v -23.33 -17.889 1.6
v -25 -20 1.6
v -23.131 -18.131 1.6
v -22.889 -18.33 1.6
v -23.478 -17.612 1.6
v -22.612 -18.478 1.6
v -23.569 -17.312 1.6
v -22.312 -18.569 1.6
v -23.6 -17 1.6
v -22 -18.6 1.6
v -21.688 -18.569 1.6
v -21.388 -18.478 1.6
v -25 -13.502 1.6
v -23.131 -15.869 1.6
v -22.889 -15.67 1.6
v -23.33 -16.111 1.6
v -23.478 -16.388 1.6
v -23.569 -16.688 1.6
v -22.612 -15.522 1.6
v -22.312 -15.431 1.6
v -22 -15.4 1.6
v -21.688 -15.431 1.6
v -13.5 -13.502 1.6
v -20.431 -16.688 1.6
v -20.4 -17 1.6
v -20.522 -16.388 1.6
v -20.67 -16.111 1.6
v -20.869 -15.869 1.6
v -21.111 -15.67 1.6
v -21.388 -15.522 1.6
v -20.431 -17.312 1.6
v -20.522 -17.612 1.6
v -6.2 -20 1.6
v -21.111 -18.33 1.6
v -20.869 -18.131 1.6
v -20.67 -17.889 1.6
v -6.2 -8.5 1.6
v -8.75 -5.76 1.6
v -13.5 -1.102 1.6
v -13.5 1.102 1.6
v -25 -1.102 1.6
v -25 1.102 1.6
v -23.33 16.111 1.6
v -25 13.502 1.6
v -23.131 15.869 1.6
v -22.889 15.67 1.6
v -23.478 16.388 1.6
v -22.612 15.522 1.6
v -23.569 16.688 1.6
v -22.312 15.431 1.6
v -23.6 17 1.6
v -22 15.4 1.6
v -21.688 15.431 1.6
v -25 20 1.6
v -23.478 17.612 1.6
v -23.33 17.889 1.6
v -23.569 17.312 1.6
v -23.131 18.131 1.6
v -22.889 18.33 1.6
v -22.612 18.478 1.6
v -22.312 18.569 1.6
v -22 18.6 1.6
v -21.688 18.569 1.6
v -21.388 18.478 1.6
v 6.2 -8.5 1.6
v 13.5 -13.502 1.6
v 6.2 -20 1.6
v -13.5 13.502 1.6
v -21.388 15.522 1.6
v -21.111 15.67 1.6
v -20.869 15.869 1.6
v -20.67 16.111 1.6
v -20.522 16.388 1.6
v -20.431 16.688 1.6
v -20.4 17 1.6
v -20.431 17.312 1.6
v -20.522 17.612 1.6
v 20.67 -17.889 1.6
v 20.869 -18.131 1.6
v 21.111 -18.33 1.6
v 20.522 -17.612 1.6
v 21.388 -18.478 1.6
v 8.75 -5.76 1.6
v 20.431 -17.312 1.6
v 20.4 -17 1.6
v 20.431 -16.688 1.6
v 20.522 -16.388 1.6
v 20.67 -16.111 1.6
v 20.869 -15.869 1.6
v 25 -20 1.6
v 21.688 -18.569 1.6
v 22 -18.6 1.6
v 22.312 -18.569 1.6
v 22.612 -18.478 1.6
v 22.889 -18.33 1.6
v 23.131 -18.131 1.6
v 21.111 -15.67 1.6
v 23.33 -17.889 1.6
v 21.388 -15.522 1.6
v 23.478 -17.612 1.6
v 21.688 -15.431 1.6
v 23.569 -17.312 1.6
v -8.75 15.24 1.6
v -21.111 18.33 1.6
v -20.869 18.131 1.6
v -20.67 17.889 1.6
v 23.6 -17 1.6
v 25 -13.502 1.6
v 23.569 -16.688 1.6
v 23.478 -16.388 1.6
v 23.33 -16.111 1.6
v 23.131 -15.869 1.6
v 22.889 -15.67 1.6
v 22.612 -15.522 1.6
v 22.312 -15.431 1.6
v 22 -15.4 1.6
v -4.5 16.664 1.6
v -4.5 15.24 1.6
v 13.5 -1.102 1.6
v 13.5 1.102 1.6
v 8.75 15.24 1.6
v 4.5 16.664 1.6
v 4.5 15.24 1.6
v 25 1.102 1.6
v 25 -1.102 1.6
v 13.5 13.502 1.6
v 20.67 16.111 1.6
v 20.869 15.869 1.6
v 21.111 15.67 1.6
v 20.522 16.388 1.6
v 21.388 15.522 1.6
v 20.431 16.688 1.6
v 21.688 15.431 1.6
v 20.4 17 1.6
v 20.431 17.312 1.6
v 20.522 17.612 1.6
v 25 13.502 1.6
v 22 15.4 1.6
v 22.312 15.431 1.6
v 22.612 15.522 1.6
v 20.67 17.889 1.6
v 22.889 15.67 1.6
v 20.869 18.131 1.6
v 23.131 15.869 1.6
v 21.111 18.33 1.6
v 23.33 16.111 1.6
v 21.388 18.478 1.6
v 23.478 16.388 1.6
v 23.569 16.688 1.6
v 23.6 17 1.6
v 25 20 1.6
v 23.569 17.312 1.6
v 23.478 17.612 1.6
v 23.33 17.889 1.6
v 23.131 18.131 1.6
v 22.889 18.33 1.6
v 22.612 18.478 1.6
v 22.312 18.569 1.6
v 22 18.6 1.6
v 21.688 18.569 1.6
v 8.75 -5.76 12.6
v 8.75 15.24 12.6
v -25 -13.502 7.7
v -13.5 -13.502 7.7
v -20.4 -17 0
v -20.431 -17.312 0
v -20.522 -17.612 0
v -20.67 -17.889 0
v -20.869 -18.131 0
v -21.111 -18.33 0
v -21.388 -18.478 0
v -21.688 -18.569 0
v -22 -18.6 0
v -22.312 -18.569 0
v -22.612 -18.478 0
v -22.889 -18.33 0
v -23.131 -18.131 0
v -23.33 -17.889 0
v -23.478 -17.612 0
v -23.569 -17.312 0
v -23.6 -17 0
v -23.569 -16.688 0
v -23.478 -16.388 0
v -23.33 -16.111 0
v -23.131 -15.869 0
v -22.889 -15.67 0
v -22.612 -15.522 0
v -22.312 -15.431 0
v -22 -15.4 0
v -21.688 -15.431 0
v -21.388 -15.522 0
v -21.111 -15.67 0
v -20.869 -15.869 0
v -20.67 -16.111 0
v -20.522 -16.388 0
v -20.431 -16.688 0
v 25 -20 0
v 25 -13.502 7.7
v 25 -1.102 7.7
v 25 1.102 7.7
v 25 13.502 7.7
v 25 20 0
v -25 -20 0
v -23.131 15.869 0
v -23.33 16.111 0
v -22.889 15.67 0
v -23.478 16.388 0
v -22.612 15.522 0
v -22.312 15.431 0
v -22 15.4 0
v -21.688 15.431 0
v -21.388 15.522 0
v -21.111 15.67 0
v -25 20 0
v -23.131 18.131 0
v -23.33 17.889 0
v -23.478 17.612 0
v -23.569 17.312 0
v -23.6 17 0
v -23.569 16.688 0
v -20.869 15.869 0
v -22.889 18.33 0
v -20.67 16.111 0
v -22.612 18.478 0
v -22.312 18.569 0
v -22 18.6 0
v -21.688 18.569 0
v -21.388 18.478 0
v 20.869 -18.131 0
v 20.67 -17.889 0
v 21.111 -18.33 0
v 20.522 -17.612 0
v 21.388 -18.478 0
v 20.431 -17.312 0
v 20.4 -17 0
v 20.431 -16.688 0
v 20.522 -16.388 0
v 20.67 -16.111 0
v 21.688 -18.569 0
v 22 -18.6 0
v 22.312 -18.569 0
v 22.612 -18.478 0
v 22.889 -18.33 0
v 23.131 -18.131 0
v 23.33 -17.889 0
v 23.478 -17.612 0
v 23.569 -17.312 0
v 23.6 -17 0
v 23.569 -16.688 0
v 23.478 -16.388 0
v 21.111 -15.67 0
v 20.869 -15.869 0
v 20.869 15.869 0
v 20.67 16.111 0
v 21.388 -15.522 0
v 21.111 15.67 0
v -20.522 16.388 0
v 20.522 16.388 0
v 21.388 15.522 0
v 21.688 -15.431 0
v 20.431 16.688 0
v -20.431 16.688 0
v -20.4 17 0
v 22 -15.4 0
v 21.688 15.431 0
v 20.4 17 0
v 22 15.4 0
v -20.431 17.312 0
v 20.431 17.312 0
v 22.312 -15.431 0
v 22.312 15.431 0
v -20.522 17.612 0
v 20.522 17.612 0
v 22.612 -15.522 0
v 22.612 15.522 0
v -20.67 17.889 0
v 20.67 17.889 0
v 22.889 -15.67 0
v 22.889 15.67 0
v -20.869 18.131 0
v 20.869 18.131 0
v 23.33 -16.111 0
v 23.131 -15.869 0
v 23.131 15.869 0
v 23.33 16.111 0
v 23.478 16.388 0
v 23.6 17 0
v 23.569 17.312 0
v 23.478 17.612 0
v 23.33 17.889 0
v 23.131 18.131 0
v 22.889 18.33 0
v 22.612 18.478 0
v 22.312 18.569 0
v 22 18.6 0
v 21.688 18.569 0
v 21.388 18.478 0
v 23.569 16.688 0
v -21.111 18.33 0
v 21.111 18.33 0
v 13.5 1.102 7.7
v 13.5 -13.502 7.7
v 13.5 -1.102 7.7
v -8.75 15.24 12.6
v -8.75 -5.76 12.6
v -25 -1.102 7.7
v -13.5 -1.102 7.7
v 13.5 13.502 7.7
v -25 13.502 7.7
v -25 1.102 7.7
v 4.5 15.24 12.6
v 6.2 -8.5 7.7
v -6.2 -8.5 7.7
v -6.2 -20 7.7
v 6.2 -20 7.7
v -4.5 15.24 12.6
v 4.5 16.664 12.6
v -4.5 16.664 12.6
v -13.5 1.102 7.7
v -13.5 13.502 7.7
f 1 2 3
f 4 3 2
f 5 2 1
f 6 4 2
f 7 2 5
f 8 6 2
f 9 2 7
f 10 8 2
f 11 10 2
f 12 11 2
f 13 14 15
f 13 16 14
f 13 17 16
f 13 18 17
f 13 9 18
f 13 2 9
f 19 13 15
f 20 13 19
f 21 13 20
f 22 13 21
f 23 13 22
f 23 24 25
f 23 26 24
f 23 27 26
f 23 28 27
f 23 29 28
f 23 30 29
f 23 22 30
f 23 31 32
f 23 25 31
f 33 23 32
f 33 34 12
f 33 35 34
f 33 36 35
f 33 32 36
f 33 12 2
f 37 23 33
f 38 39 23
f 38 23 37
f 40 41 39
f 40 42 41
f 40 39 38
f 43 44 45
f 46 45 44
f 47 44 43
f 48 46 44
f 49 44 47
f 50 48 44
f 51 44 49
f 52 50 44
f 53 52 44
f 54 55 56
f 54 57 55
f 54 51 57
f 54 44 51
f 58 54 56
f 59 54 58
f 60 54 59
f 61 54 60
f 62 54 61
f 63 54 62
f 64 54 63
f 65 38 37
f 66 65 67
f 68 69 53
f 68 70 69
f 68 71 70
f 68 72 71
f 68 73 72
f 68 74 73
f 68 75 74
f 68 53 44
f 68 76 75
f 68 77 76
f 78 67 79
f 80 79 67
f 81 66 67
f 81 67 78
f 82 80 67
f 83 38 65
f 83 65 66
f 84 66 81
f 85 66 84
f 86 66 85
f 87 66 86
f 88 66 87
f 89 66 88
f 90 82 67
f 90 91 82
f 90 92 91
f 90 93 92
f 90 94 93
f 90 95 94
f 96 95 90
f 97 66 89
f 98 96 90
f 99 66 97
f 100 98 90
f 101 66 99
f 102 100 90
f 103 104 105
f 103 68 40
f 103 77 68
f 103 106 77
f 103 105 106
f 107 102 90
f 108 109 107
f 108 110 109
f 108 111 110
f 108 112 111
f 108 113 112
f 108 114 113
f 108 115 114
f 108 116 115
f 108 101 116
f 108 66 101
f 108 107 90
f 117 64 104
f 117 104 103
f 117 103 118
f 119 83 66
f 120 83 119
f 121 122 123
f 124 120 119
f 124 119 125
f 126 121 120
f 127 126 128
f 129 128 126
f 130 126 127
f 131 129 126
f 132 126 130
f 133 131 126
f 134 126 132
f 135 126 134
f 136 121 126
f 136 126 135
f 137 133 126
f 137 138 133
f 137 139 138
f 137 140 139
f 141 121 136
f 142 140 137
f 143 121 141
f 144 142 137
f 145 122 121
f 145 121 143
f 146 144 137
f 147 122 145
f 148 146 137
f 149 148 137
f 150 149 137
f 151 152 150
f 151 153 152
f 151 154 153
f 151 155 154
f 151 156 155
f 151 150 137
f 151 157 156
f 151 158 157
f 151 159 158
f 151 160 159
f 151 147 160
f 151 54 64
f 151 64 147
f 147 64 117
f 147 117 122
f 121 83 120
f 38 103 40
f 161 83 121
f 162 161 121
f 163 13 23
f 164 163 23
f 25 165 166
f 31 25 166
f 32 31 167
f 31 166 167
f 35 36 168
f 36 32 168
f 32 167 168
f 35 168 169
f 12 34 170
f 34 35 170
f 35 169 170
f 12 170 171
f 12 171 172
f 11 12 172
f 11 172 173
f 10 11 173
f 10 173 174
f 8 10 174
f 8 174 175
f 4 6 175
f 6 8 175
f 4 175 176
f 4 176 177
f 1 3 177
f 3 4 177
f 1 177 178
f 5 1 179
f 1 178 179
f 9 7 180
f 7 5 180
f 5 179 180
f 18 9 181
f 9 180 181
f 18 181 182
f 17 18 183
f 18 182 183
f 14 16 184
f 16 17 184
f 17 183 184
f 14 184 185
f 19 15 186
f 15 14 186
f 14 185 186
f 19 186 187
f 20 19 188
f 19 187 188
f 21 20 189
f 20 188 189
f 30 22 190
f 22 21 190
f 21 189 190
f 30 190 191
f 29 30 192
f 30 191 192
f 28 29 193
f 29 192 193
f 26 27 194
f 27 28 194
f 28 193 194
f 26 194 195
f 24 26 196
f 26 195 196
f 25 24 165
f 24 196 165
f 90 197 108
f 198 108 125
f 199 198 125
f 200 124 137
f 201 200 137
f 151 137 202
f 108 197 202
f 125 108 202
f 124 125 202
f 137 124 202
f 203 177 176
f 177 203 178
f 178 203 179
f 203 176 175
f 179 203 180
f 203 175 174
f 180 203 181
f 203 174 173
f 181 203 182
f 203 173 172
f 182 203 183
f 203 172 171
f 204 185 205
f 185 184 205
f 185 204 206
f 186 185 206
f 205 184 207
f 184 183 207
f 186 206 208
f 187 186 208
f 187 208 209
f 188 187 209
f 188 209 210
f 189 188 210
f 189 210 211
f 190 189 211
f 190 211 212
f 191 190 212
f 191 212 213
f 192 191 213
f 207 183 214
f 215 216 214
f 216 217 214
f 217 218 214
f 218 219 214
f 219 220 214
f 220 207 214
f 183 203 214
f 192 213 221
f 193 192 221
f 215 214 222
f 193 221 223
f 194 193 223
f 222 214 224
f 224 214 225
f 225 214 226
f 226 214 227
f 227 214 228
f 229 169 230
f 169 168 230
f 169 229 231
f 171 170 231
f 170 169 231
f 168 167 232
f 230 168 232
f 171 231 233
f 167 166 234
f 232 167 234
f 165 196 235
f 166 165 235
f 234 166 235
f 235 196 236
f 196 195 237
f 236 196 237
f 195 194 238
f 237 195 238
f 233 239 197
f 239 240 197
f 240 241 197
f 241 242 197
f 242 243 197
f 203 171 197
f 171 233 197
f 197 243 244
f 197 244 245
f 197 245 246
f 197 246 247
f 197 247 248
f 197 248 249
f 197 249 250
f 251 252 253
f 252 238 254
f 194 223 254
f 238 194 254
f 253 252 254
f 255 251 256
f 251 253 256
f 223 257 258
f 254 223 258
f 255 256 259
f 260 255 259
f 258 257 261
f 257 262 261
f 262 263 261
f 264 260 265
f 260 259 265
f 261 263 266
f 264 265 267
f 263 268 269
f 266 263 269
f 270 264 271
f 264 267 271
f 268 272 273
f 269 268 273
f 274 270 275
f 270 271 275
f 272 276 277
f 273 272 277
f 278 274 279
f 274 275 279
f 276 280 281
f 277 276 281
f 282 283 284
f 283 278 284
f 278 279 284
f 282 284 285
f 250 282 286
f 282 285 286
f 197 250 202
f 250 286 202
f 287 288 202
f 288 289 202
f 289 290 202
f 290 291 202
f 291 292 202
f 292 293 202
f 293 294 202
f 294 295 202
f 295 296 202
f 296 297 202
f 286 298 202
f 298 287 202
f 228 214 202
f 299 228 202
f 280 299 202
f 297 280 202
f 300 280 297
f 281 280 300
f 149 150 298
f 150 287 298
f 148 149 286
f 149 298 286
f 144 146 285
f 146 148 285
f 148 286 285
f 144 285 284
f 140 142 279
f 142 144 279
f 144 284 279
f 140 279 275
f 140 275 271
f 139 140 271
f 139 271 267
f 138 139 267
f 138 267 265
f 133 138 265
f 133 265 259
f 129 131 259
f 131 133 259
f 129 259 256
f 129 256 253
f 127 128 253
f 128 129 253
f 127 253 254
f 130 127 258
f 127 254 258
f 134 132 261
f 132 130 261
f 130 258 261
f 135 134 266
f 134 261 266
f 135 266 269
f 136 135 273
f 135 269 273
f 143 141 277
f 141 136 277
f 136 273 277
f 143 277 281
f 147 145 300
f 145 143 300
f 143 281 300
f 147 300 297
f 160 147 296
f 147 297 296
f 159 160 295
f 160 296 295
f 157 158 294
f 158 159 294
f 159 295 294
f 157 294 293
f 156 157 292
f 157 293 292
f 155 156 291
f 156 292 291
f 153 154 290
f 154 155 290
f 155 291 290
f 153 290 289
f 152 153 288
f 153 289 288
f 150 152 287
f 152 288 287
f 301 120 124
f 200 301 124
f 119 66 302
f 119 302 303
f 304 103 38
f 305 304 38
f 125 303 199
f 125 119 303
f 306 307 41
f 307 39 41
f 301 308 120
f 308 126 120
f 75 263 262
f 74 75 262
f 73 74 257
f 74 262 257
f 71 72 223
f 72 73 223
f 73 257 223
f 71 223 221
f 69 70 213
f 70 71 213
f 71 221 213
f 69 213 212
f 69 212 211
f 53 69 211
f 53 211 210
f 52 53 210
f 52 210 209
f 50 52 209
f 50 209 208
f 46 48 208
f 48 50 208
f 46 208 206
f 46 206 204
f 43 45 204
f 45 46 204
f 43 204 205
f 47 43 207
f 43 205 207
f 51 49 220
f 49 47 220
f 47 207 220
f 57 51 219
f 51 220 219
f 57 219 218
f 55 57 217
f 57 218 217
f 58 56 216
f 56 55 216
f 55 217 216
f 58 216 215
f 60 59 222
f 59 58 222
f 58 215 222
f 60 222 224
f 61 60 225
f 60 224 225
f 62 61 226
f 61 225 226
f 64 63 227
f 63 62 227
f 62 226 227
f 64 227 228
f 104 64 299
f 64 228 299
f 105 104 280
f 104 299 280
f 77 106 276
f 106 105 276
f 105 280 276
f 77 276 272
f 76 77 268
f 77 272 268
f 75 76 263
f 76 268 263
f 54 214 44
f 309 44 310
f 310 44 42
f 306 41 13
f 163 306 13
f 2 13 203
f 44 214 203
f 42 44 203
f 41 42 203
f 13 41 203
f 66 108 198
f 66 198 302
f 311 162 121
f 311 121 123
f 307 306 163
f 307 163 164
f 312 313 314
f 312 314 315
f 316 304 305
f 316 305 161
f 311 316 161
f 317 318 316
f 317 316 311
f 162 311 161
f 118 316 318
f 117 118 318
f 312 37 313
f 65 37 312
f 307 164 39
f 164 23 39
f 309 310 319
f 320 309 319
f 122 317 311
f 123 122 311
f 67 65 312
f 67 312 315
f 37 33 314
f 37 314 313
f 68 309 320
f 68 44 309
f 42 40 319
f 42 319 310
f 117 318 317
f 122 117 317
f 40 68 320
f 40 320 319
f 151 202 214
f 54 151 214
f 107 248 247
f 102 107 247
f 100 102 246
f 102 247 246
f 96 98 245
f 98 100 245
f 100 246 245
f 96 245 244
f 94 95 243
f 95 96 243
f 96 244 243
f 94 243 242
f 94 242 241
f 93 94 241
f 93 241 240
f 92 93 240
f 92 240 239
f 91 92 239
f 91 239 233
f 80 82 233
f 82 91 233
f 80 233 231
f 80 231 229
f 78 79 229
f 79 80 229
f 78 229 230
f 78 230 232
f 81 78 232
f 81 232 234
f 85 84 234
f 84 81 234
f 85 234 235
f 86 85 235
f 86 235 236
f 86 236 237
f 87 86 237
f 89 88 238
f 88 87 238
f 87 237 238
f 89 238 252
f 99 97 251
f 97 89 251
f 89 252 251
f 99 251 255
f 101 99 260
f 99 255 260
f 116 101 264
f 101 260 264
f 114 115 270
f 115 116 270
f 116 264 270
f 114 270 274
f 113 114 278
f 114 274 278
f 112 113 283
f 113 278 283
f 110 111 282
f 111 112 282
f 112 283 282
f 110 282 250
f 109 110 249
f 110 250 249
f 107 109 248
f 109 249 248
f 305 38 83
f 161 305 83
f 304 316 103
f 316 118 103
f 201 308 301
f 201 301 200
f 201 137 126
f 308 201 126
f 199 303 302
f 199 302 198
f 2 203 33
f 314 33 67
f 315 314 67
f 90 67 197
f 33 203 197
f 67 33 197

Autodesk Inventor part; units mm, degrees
ref_plane "YZ Plane" through (0, 0, 0) normal (1, 0, 0) x (0, 1, 0)
ref_plane "XZ Plane" through (0, 0, 0) normal (0, 1, 0) x (-1, 0, 0)
ref_plane "XY Plane" through (0, 0, 0) normal (0, 0, 1) x (1, 0, 0)
sketch "スケッチ1" plane through (0, 0, 0) normal (0, 0, 1) x (1, 0, 0)
  line L0 (-25, -20) -> (25, -20)
  line L1 (25, -20) -> (25, 20)
  line L2 (25, 20) -> (-25, 20)
  line L3 (-25, 20) -> (-25, -20)
  line L4 (-25, -20) -> (25, 20) construction
  line L5 (25, -20) -> (-25, 20) construction
  line L6 (-22, -17) -> (22, -17) construction
  line L7 (22, -17) -> (22, 17) construction
  line L8 (22, 17) -> (-22, 17) construction
  line L9 (-22, 17) -> (-22, -17) construction
  line L10 (-22, -17) -> (22, 17) construction
  line L11 (22, -17) -> (-22, 17) construction
  circle A0 centre (-22, -17) radius 1.6
  circle A1 centre (-22, 17) radius 1.6
  circle A2 centre (22, -17) radius 1.6
  circle A3 centre (22, 17) radius 1.6
  line L12 (-25, -13.5025) -> (-13.5, -13.5025)
  line L13 (-13.5, -13.5025) -> (-13.5, -1.1025)
  line L14 (-13.5, -1.1025) -> (-25, -1.1025)
  line L15 (-6.2, -20) -> (-6.2, -8.5)
  line L16 (-6.2, -8.5) -> (6.2, -8.5)
  line L17 (6.2, -8.5) -> (6.2, -20)
  line L18 (-25, 0) -> (25, 0) construction
  line L19 (0, -20) -> (0, 20) construction
  line L20 (-25, 13.5025) -> (-13.5, 13.5025)
  line L21 (-13.5, 13.5025) -> (-13.5, 1.1025)
  line L22 (-13.5, 1.1025) -> (-25, 1.1025)
  line L23 (25, -13.5025) -> (13.5, -13.5025)
  line L24 (13.5, -13.5025) -> (13.5, -1.1025)
  line L25 (13.5, -1.1025) -> (25, -1.1025)
  line L26 (13.5, 1.1025) -> (25, 1.1025)
  line L27 (13.5, 13.5025) -> (13.5, 1.1025)
  line L28 (25, 13.5025) -> (13.5, 13.5025)
  line L29 (-8.75, -5.76) -> (8.75, -5.76)
  line L30 (8.75, -5.76) -> (8.75, 15.24)
  line L31 (8.75, 15.24) -> (-8.75, 15.24)
  line L32 (-8.75, 15.24) -> (-8.75, -5.76)
  line L33 (-8.75, -5.76) -> (8.75, 15.24) construction
  line L34 (8.75, -5.76) -> (-8.75, 15.24) construction
  line L35 (-4.5, 15.24) -> (-4.5, 16.664)
  line L36 (-4.5, 16.664) -> (4.5, 16.664)
  line L37 (4.5, 16.664) -> (4.5, 15.24)
  point P0 (0, 0)
  point P1 (-13.5, -7.3025)
  point P2 (0, -8.5)
  point P3 (0, 4.74)
  point P4 (0, 16.664)
  point P5 (0, 4.74)
  dimension "d0" = 50
  dimension "d1" = 40
  dimension "d2" = 44
  dimension "d3" = 34
  dimension "d4" = 3.2
  dimension "d5" = 3.2
  dimension "d6" = 3.2
  dimension "d7" = 3.2
  dimension "d8" = 11.5
  dimension "d9" = 12.4
  dimension "d10" = 7.3025
  dimension "d11" = 11.5
  dimension "d12" = 12.4
  dimension "d17" = 17.5
  dimension "d18" = 21
  dimension "d19" = 9
  dimension "d20" = 1.424
  dimension "d21" = 15.26
extrude "押し出し1" add sketch "スケッチ1" along normal blind 1.6 contours L3 L12 L13 L14 L22 L21 L20 L2 L1 L28 L27 L26 L25 L24 L23 L0 L17 L16 L15 | L15 L16 L17 L0 | L3 L14 L13 L12 | L3 L20 L21 L22 | L23 L24 L25 L1 | L26 L27 L28 L1 | L32 L31 L30 L29 | L35 L36 L37 L31
extrude "押し出し2" add sketch "スケッチ1" along normal blind 7.7 contours L15 L16 L17 L0 | L3 L14 L13 L12 | L3 L20 L21 L22 | L23 L24 L25 L1 | L26 L27 L28 L1
extrude "押し出し3" add sketch "スケッチ1" along normal blind 12.6 contours L32 L31 L30 L29 | L35 L36 L37 L31
equation "\"d5\" = d4"
equation "\"d6\" = d4"
equation "\"d7\" = d4"
equation "\"d11\" = d8"
equation "\"d12\" = d9"
properties part number "Quad-Load-Cell-Amplifier-to-RS-485-Conv-Module"
